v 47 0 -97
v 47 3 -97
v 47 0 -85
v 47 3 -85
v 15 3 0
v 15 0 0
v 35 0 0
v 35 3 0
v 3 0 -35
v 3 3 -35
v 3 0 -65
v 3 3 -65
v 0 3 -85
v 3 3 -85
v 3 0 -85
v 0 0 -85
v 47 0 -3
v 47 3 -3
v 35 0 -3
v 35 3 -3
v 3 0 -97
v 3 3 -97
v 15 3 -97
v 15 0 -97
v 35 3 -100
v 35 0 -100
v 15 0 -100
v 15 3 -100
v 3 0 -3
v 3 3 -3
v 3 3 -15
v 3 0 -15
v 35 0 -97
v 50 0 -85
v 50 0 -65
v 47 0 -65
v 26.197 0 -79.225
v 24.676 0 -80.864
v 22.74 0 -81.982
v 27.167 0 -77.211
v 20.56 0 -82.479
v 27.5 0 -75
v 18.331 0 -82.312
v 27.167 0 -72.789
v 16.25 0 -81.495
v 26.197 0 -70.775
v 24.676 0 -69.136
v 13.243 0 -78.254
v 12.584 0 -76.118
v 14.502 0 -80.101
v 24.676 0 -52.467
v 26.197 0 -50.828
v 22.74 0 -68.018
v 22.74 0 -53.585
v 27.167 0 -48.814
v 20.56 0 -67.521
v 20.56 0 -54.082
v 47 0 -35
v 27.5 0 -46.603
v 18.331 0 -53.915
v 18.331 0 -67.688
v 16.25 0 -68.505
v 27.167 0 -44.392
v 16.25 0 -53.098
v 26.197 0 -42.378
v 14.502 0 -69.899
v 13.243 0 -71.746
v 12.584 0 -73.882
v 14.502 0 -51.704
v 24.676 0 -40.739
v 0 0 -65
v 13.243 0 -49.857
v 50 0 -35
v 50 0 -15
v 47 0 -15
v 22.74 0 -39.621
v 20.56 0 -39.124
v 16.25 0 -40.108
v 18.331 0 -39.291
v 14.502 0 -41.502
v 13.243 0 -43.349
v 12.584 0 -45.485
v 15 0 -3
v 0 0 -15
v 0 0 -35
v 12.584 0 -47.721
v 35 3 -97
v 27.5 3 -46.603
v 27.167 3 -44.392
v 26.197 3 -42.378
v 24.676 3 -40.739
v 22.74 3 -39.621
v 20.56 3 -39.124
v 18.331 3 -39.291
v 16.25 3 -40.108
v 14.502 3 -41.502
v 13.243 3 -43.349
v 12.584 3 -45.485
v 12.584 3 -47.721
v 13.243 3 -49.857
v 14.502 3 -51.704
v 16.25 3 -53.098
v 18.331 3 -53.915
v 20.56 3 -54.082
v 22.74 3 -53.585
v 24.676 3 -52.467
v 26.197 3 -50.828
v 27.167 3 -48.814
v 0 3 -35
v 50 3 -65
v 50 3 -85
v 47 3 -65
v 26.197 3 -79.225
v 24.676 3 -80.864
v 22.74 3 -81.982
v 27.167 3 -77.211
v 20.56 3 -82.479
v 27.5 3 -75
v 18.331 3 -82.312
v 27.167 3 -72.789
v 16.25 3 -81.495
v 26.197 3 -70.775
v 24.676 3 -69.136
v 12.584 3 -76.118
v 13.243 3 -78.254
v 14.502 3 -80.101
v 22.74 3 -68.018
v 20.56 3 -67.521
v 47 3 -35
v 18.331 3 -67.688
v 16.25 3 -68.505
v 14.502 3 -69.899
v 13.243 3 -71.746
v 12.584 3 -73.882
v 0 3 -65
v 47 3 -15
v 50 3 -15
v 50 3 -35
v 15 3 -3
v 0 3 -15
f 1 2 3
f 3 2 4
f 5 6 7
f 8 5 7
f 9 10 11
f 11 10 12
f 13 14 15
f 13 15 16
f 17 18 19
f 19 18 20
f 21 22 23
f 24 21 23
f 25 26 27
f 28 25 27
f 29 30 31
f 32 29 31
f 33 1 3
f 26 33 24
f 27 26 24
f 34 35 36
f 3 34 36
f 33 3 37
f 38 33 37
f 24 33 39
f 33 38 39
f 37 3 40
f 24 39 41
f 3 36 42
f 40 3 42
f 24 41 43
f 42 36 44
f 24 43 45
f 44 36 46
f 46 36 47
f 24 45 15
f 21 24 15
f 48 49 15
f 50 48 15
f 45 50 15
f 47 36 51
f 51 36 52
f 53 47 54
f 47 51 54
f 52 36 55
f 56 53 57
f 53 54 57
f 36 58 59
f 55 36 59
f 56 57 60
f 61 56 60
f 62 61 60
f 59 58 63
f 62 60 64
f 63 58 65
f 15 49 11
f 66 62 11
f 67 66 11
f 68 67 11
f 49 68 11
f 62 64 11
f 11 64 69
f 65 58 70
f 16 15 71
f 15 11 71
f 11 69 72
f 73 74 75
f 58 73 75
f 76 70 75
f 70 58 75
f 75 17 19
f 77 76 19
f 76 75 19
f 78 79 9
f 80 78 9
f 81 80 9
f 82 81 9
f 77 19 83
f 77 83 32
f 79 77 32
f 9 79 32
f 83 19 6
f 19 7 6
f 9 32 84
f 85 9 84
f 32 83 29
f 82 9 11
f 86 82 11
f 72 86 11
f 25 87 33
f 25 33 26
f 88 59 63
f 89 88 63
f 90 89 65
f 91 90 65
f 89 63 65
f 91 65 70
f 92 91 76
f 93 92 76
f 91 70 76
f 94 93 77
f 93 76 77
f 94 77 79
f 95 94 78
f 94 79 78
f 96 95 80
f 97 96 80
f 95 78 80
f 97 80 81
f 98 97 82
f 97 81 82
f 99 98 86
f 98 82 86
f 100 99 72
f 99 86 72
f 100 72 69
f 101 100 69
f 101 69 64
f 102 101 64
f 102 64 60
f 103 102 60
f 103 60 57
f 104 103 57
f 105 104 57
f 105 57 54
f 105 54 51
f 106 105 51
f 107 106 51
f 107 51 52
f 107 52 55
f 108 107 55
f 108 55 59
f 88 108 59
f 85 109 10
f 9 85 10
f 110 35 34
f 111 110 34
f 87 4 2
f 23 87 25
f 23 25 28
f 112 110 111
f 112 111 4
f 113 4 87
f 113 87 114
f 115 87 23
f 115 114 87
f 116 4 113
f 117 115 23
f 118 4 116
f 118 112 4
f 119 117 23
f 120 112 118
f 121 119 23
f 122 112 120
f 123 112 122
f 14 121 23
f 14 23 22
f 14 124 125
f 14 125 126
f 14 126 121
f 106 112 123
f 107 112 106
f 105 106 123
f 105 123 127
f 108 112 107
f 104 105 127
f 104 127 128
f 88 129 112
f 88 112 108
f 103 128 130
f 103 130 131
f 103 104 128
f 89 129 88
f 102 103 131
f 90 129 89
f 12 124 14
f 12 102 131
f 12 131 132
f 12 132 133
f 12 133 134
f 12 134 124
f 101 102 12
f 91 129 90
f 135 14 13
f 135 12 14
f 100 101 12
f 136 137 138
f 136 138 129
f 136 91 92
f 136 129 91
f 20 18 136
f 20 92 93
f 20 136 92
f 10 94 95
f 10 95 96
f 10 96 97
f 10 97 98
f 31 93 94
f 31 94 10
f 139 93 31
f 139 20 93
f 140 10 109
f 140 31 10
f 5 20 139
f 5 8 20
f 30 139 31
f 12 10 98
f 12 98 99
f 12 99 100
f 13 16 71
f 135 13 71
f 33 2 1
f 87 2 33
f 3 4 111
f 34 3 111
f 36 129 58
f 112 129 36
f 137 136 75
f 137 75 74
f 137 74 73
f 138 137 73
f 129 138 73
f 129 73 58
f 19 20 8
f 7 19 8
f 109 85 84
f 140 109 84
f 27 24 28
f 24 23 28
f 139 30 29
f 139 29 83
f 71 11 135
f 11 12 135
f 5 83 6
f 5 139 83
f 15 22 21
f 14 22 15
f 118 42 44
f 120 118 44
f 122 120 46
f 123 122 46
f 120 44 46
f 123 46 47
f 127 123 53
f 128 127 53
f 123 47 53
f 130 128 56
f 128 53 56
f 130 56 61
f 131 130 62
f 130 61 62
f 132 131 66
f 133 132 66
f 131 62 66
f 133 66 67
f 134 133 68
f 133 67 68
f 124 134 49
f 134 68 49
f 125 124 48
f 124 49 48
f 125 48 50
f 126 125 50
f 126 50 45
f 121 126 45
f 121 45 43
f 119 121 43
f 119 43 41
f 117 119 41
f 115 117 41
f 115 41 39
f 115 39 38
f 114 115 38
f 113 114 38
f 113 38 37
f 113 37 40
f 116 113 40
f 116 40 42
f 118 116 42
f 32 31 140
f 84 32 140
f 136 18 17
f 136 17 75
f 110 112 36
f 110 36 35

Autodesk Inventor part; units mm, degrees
ref_plane "YZ Plane" through (0, 0, 0) normal (1, 0, 0) x (0, 1, 0)
ref_plane "XZ Plane" through (0, 0, 0) normal (0, 1, 0) x (-1, 0, 0)
ref_plane "XY Plane" through (0, 0, 0) normal (0, 0, 1) x (1, 0, 0)
sketch "Sketch1" plane through (0, 0, 0) normal (0, 1, 0) x (-1, 0, 0)
  line L0 (0, 0) -> (-50, 0)
  line L1 (-50, 0) -> (-50, -100)
  line L2 (-50, -100) -> (0, -100)
  line L3 (0, -100) -> (0, 0)
  dimension "d0" = 100
  dimension "d1" = 50
extrude "Base" add sketch "Sketch1" along normal blind 3
sketch "Sketch2" plane through (0, 3, 0) normal (0, 1, 0) x (1, 0, 0)
  line L0 (0, 0) -> (50, 0) projected
  line L1 (50, 100) -> (0, 100) projected
  line L2 (0, 0) -> (3, 0)
  line L3 (3, 100) -> (0, 100)
  line L4 (0, 100) -> (0, 0)
  line L5 (0, 100) -> (0, 0) projected
  line L6 (0, 0) -> (3, 0)
  line L7 (3, 0) -> (3, 15)
  line L8 (3, 15) -> (0, 15)
  line L9 (0, 15) -> (0, 0)
  line L10 (0, 100) -> (3, 100)
  line L11 (3, 100) -> (3, 85)
  line L12 (3, 85) -> (0, 85)
  line L13 (0, 85) -> (0, 100)
  line L14 (0, 35) -> (3, 35)
  line L15 (3, 35) -> (3, 65)
  line L16 (3, 65) -> (0, 65)
  line L17 (0, 65) -> (0, 35)
  line L18 (25, 0) -> (25, 100) construction
  line L19 (50, 0) -> (47, 0)
  line L20 (47, 100) -> (50, 100)
  line L21 (50, 100) -> (50, 0)
  line L22 (50, 100) -> (50, 0)
  line L23 (50, 0) -> (47, 0)
  line L24 (47, 0) -> (47, 15)
  line L25 (47, 15) -> (50, 15)
  line L26 (50, 15) -> (50, 0)
  line L27 (50, 100) -> (47, 100)
  line L28 (47, 100) -> (47, 85)
  line L29 (47, 85) -> (50, 85)
  line L30 (50, 85) -> (50, 100)
  line L31 (50, 35) -> (47, 35)
  line L32 (47, 35) -> (47, 65)
  line L33 (47, 65) -> (50, 65)
  line L34 (50, 65) -> (50, 35)
  line L35 (0, 50) -> (50, 50) construction
  line L36 (50, 0) -> (50, 100) projected
  line L37 (15, 0) -> (3, 0)
  line L38 (3, 0) -> (3, 3)
  line L39 (3, 3) -> (15, 3)
  line L40 (15, 3) -> (15, 0)
  line L41 (50, 0) -> (0, 0)
  line L42 (35, 0) -> (47, 0)
  line L43 (47, 3) -> (35, 3)
  line L44 (35, 3) -> (35, 0)
  line L45 (0, 100) -> (50, 100)
  line L46 (25, 100) -> (25, 0) construction
  line L47 (15, 100) -> (3, 100)
  line L48 (3, 97) -> (15, 97)
  line L49 (15, 97) -> (15, 100)
  line L50 (50, 100) -> (0, 100)
  line L51 (47, 97) -> (35, 97)
  line L52 (35, 100) -> (47, 100)
  line L53 (35, 97) -> (35, 100)
  point P0 (0, 15)
  point P1 (0, 85)
  point P2 (0, 65)
  point P3 (0, 35)
  point P4 (50, 100)
  point P5 (47, 97)
  point P6 (15, 100)
  point P7 (3, 97)
  dimension "d10" = 15
  dimension "d11" = 15
  dimension "d12" = 20
  dimension "d13" = 20
  dimension "d14" = 30
  dimension "d15" = 3
  dimension "d21" = 3
  dimension "d22" = 10
  dimension "d39" = 20
extrude "Tabs" cut sketch "Sketch2" against normal through all contours L4 L8 L7 L0 | L7 L39 L40 L0 | L4 L16 L15 L14 | L44 L43 L24 L0 | L24 L25 L21 L0 | L4 L1 L11 L12 | L1 L49 L48 L11 | L31 L32 L33 L21 | L1 L28 L51 L53 | L29 L28 L1 L21
sketch "Sketch4" plane through (0, 0, 0) normal (0, -1, 0) x (1, 0, 0)
  circle A0 centre (20, -46.603) radius 7.5
  circle A1 centre (20, -75) radius 7.5
  line L0 (50, -100) -> (0, -100) projected
  line L1 (3, -85) -> (3, -97) projected
  line L2 (3, -35) -> (3, -65) projected
  point P0 (0, 0)
  point P1 (35, -100)
  point P2 (15, -100)
  dimension "d31" = 25
  dimension "d32" = 28.397
  dimension "d33" = 17
  dimension "d34" = 17
  dimension "d35" = 15
  dimension "d36" = 15
extrude "BNC" cut sketch "Sketch4" against normal through all
equation "\"d0\" = Width"
equation "\"d2\" = Thickness"
equation "\"d10\" = WidthTabOffset"
equation "\"d11\" = d10"
equation "\"d12\" = BaseTabWidth"
equation "\"d13\" = d12"
equation "\"d15\" = Thickness"
equation "\"d21\" = d15"
equation "\"d22\" = 0.5 * VerticalTab"
equation "\"d34\" = d33"
equation "\"d36\" = d35"
equation "\"Width\" = 100"
equation "\"Thickness\" = 3"
equation "\"WidthTabOffset\" = 15"
equation "\"BaseTabWidth\" = 20"
equation "\"VerticalTab\" = 20"
properties part number "ShortSideFront"
